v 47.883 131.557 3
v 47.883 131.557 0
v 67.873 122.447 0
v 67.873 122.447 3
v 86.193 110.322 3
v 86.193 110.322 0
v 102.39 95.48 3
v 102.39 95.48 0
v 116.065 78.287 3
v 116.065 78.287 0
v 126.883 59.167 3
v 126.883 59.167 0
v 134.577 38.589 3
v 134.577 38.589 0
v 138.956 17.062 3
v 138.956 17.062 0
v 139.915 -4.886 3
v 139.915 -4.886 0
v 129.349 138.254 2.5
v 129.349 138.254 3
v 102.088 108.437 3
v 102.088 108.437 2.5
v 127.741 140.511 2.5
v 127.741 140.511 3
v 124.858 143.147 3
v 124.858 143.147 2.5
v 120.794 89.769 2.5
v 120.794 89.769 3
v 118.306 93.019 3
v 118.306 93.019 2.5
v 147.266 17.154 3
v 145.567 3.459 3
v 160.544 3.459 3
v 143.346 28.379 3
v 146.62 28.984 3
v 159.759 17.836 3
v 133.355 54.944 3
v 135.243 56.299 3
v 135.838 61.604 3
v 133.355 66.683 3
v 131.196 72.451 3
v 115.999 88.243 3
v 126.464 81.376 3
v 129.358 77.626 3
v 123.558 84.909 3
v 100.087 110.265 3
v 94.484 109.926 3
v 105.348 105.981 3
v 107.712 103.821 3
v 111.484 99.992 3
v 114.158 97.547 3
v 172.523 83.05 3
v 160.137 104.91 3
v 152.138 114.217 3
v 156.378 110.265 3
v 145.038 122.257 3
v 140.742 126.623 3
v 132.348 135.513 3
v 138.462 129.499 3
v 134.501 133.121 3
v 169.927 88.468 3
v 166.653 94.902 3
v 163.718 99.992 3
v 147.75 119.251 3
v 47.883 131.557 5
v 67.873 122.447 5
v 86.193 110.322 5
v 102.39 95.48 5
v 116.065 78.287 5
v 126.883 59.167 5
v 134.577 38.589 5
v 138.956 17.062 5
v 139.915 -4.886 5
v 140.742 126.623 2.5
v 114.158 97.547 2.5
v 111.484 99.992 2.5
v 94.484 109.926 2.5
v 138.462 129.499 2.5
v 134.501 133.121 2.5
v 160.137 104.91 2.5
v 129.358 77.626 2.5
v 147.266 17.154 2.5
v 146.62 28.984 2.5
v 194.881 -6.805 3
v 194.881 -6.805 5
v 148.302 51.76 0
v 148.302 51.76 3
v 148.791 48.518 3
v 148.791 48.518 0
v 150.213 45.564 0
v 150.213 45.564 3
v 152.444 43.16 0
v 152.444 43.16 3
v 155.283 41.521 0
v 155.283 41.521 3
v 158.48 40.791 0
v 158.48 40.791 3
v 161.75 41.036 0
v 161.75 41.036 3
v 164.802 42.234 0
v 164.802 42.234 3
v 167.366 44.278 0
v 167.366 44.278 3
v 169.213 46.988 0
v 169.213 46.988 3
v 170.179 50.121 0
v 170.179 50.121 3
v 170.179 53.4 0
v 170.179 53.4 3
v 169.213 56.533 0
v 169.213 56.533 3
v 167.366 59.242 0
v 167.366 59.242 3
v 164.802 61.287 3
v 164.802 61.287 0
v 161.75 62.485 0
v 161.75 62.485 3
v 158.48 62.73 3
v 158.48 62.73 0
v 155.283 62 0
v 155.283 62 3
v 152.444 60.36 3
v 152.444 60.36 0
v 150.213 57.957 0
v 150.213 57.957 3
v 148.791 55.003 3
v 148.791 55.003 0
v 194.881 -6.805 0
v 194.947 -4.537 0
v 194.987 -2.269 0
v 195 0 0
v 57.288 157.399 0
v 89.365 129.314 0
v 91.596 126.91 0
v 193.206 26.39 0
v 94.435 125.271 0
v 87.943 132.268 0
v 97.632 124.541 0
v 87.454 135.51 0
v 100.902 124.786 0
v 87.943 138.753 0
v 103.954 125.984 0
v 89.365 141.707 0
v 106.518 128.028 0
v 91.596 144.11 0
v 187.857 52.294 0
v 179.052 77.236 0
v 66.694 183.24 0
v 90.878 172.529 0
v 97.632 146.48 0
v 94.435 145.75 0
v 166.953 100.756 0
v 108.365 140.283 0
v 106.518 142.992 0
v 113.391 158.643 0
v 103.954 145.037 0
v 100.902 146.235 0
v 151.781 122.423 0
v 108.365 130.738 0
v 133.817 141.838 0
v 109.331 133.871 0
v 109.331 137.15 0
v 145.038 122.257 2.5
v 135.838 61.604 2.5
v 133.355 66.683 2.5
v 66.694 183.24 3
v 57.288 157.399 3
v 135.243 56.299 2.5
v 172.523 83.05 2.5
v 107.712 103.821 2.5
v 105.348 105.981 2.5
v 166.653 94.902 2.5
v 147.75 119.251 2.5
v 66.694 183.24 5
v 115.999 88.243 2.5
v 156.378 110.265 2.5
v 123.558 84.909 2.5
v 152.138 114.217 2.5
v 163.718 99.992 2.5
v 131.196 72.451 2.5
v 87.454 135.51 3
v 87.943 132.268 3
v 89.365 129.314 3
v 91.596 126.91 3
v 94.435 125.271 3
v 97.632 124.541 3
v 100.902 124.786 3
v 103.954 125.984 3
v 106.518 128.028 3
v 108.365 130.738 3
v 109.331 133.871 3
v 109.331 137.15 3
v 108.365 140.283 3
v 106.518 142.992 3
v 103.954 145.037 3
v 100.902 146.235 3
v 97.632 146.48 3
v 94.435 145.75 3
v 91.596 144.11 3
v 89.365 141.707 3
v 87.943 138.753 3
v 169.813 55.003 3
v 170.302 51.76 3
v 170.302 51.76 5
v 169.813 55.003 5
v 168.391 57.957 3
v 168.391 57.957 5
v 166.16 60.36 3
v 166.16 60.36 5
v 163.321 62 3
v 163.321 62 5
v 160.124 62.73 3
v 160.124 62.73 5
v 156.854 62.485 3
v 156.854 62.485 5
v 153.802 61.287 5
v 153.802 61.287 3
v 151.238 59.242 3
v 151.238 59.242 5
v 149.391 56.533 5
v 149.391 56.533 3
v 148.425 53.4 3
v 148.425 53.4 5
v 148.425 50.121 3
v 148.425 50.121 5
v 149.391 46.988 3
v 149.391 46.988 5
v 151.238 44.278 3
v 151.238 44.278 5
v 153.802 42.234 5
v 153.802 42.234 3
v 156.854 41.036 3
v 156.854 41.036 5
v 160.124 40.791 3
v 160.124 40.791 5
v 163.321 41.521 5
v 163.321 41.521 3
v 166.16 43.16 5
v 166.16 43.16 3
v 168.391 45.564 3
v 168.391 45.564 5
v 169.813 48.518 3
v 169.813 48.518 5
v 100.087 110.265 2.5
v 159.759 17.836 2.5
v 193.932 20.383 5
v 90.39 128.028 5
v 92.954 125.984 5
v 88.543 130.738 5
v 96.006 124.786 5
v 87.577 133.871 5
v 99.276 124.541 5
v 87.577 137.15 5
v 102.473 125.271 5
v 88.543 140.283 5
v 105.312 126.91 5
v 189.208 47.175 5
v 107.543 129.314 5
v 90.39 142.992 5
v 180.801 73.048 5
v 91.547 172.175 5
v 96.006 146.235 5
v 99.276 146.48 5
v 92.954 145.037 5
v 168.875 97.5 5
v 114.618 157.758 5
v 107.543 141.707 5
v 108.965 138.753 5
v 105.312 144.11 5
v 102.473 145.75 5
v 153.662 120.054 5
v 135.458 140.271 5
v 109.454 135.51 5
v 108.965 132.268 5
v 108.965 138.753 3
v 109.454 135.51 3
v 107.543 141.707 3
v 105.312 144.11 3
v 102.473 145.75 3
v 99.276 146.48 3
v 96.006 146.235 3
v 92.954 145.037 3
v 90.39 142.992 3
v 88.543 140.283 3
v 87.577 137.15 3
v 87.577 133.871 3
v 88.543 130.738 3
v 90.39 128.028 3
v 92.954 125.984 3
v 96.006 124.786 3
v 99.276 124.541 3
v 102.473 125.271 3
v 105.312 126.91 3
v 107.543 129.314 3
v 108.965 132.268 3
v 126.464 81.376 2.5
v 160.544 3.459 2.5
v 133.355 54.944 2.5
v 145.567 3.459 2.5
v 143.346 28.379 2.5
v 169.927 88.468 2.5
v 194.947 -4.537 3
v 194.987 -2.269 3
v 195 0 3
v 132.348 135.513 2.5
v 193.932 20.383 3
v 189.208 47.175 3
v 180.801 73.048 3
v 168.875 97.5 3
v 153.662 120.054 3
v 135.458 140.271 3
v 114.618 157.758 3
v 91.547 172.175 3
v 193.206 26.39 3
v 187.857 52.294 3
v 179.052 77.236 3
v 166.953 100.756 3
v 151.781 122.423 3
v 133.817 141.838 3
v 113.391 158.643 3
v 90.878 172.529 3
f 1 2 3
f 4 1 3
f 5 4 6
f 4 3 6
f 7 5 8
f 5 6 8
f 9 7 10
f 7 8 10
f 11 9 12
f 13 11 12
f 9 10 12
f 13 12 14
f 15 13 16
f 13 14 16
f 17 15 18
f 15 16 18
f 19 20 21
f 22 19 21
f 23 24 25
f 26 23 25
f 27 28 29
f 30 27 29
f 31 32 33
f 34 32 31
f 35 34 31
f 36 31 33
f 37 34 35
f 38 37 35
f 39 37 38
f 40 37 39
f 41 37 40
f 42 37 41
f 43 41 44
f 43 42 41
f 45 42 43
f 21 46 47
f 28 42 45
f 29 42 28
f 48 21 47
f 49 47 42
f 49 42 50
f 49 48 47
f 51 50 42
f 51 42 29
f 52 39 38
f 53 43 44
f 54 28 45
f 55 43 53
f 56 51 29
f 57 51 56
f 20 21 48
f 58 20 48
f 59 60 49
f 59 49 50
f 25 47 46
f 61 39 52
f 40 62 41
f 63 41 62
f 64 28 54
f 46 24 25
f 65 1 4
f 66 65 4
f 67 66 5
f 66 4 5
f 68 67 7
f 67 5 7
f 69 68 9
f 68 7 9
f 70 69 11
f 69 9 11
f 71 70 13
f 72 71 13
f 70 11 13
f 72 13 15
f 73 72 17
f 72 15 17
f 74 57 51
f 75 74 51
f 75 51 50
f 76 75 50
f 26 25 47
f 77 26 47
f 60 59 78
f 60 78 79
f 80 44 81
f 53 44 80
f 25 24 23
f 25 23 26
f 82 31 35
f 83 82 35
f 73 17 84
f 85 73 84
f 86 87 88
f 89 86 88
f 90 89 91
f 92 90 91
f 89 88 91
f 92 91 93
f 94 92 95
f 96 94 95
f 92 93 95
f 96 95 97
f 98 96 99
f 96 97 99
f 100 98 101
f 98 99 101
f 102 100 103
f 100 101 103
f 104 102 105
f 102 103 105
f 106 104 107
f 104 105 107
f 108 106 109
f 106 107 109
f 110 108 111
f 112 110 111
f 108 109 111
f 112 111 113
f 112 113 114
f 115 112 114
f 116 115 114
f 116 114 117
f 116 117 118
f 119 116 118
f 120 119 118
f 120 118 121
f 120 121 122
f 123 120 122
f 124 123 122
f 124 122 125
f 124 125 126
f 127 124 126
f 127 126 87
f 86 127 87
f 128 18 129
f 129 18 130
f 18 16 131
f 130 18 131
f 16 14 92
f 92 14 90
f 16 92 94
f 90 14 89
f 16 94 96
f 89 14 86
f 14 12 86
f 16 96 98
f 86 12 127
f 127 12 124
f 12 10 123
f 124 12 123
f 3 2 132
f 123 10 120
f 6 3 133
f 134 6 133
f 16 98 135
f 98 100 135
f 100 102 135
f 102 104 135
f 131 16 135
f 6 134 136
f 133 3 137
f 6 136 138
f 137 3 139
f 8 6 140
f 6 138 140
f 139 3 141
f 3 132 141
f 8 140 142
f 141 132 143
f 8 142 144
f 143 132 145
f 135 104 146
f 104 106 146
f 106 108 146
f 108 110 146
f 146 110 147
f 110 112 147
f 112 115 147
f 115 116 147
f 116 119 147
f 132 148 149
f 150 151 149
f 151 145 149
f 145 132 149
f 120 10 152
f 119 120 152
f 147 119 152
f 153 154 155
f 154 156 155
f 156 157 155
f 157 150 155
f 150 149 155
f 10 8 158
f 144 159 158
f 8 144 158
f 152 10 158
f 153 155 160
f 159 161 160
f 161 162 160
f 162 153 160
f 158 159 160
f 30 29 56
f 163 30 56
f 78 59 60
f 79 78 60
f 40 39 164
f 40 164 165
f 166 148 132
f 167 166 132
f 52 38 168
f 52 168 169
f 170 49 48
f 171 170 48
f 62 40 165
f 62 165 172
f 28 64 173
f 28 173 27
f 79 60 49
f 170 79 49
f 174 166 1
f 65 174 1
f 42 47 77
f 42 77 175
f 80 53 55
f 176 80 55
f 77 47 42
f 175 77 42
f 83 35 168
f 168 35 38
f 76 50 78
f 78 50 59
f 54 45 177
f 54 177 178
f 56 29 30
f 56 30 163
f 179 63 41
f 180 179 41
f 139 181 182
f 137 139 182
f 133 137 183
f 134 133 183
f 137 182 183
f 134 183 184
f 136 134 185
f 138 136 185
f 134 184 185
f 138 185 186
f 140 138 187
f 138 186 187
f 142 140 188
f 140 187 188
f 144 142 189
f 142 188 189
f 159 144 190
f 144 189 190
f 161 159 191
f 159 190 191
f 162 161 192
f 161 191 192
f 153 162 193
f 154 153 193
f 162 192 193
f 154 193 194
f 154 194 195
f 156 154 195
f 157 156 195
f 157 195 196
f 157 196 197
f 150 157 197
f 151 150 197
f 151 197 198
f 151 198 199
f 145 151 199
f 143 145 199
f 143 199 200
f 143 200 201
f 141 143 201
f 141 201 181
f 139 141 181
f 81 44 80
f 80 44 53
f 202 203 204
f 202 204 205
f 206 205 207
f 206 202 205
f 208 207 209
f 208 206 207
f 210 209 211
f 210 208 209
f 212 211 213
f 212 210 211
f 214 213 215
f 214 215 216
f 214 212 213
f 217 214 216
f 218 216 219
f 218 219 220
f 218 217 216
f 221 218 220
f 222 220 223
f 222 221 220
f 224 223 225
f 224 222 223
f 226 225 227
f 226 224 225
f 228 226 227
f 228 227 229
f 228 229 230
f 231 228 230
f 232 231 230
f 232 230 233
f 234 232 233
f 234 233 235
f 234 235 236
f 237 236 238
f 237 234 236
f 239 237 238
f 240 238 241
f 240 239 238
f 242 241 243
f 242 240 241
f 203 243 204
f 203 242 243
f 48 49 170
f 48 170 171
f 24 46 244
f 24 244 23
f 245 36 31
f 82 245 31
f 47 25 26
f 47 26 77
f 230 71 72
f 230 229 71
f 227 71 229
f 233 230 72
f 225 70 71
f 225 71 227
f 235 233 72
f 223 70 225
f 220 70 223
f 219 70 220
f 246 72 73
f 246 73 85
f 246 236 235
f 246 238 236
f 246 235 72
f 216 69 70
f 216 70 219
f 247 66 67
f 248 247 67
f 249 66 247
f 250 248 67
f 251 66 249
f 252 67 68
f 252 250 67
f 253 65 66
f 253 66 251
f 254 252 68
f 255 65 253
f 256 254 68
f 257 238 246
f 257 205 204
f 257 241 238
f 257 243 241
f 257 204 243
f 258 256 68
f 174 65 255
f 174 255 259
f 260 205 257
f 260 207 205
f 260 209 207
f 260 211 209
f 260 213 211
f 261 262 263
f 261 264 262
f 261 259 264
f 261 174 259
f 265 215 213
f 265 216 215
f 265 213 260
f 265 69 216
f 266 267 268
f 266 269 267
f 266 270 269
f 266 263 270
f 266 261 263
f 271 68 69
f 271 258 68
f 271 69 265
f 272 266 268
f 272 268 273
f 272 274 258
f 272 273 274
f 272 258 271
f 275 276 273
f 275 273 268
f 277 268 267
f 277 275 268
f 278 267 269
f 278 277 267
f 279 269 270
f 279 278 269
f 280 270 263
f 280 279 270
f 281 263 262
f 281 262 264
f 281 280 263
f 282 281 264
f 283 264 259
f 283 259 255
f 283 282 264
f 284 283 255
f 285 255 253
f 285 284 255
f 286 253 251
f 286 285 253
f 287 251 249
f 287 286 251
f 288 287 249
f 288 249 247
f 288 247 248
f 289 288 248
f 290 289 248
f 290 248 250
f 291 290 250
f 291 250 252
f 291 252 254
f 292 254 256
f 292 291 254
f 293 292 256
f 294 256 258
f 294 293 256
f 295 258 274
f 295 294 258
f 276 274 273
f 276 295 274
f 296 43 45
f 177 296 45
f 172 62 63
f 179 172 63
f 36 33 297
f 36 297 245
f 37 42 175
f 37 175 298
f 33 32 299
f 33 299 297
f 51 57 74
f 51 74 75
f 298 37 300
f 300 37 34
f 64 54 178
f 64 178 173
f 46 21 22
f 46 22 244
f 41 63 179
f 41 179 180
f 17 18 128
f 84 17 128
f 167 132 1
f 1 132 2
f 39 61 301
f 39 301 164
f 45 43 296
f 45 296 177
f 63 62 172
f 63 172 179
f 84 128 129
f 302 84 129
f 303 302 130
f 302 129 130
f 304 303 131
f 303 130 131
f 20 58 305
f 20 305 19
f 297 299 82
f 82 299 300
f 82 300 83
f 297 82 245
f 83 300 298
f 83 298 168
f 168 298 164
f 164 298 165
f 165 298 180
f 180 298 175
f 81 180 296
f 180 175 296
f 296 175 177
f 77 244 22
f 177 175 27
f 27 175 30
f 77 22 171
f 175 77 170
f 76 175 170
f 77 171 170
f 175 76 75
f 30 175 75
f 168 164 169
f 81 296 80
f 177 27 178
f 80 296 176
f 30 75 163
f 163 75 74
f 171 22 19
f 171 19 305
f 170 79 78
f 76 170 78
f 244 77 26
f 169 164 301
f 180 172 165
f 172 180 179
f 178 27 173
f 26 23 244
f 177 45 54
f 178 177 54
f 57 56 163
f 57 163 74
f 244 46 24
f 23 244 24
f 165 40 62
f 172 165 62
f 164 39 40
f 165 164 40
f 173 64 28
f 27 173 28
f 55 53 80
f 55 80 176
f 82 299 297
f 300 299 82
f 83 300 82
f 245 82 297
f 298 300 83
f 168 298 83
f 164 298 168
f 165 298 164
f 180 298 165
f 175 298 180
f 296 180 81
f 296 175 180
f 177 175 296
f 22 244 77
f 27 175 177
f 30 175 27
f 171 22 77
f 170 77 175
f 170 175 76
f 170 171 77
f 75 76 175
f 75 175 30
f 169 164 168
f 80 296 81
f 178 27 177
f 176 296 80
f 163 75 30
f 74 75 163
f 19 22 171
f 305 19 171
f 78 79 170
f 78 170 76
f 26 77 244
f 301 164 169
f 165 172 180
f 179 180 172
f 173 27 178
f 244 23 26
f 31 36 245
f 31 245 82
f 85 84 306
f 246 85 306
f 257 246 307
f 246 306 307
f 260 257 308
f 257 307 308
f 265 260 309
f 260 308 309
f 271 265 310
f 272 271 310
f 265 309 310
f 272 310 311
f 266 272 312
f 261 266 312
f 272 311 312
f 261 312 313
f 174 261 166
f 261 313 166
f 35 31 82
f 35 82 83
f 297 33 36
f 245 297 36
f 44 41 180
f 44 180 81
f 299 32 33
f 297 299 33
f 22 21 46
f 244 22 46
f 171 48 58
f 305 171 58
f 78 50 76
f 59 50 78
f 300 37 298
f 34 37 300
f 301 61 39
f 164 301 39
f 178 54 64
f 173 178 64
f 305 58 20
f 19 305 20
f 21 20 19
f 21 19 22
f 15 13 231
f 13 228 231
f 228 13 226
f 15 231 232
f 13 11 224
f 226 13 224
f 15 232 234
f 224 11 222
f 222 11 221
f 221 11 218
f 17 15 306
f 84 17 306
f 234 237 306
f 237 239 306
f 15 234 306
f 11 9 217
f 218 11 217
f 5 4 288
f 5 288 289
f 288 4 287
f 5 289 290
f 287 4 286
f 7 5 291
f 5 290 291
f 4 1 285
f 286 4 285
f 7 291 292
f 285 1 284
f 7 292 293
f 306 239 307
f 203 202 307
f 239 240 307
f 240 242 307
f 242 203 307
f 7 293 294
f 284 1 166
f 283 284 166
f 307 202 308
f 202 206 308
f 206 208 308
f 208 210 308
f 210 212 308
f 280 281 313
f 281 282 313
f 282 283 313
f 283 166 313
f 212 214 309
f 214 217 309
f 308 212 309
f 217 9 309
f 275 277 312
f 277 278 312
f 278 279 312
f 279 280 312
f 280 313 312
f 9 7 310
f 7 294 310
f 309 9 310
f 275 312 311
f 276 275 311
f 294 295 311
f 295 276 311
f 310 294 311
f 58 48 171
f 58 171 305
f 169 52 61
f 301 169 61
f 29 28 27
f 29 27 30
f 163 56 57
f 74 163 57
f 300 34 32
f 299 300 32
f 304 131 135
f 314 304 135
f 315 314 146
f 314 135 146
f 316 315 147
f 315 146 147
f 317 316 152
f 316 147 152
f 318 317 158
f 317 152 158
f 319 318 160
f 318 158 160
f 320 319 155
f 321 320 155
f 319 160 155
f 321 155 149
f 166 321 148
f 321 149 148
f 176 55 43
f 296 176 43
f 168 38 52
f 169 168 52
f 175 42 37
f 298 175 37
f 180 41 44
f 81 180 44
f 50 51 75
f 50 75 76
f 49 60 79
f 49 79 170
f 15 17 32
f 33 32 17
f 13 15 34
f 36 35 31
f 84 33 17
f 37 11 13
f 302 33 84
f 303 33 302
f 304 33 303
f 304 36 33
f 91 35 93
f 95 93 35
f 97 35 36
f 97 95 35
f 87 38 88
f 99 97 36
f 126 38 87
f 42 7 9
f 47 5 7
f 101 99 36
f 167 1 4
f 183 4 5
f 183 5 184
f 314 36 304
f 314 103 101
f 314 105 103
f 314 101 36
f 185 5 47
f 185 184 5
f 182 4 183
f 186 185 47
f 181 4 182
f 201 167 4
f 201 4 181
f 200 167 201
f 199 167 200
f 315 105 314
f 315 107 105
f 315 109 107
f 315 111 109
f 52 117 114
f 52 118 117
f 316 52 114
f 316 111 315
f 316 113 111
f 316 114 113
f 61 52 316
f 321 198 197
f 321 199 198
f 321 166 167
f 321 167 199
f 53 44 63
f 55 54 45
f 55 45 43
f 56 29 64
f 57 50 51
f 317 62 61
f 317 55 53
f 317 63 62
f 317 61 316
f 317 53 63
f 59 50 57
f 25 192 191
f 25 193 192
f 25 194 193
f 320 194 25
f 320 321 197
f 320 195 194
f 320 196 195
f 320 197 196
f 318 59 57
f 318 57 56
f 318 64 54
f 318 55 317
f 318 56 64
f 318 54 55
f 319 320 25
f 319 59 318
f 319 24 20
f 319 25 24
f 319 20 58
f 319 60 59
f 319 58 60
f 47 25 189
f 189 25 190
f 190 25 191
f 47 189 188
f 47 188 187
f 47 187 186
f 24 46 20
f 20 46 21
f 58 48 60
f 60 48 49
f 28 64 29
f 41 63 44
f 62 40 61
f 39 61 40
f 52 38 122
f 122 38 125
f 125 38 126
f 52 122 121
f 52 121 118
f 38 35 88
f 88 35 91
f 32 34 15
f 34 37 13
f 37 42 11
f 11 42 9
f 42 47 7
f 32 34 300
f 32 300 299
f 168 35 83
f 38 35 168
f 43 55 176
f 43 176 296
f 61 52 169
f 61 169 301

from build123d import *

# Parameters (mm, degrees)
F1_DEPTH = 3
F2_D     = 22
F4_DEPTH = 0.5
F5_DEPTH = 0.5
F6_R     = 11
F7_DEPTH = 2


with BuildPart() as f1:
    # F0 (on Top) → F1 (new body)
    with BuildSketch(Plane.XY):
        with BuildLine():
            ThreePointArc((167.5, 0), (137.2079674184, 96.0740530888), (57.288374007, 157.3985139816))
            Line((57.288374007, 157.3985139816), (47.8828200656, 131.55696691))
            ThreePointArc((47.8828200656, 131.55696691), (114.6812862005, 80.3007010891), (140, 0))
            ThreePointArc((140, 0), (139.9786773219, -2.4433369012), (139.9147157827, -4.8859295383))
            Line((139.9147157827, -4.8859295384), (167.3979635257, -5.8456656977))
            ThreePointArc((167.3979635257, -5.8456656977), (167.4744889387, -2.9232780782), (167.5, 0))
        make_face()
        with BuildLine():
            ThreePointArc((194.8812112687, -6.805401857), (194.9703005555, -3.4032192553), (195, 0))
            ThreePointArc((195, 0), (159.7346486364, 111.8474050885), (66.6939279485, 183.2400610533))
            Line((66.6939279485, 183.2400610533), (57.288374007, 157.3985139816))
            ThreePointArc((57.288374007, 157.3985139816), (137.2079674184, 96.0740530888), (167.5, 0))
            ThreePointArc((167.5, 0), (167.4744889387, -2.9232780782), (167.3979635257, -5.8456656977))
            Line((167.3979635257, -5.8456656977), (194.8812112687, -6.805401857))
        make_face()
    extrude(amount=F1_DEPTH)

    # F2 (through all)
    with Locations(Plane(origin=(0, 0, 0), x_dir=(1, 0, 0), z_dir=(0, 0, -1))):
        with Locations((98.454029759, -135.5103465578), (159.3019664794, -51.7603465578), (159.3019664794, 51.7603465578)):
            Hole(F2_D / 2)

    # F3 (on face) → F4 (cut)
    with BuildSketch(Plane.XY.offset(3)):
        Polygon((124.8575970531, 143.1473642588), (94.484128058, 109.9263876677), (115.9989386797, 88.2433280349), (133.3547979593, 54.9442470074), (143.3461606503, 28.3794309944), (145.5672979355, 3.4586815163), (160.543859005, 3.4586815163), (159.7588807344, 17.8357362747), (147.2658441237, 17.1536242262), (146.6199150106, 28.9839621818), (135.2427917925, 56.2990322707), (172.5227981806, 83.0503925681), (169.9266433716, 88.468439877), (135.8380764723, 61.6039372981), (133.3547979593, 66.6833594441), (166.6532456875, 94.9023813009), (163.7184619904, 99.9917068722), (131.1962753534, 72.4506676197), (129.3583959341, 77.6262283325), (160.1365059614, 104.9097552896), (156.3779860735, 110.2651243658), (126.4639943838, 81.376105547), (123.5579997301, 84.909029305), (152.1375179291, 114.2166703939), (147.7499727119, 119.2514494077), (120.7944825292, 89.7688865662), (118.305986066, 93.0192662431), (145.0375318527, 122.2568899393), (140.7417208361, 126.6233589756), (114.1578362166, 97.5472396562), (111.4842006113, 99.9917068722), (138.4624362817, 129.499147587), (134.5007407959, 133.1212697326), (107.7115796058, 103.8206291987), (105.3481470084, 105.9814821923), (132.3479912187, 135.512557244), (129.3493856729, 138.2541398801), (102.0875399782, 108.436500749), (100.0874832057, 110.2651243658), (127.7409781047, 140.5111297479), align=None)
    extrude(amount=-F4_DEPTH, mode=Mode.SUBTRACT)


with BuildPart() as f5:
    # F3 (on face) → F5 (new body)
    with BuildSketch(Plane.XY.offset(3)):
        Polygon((124.8575970531, 143.1473642588), (94.484128058, 109.9263876677), (115.9989386797, 88.2433280349), (133.3547979593, 54.9442470074), (143.3461606503, 28.3794309944), (145.5672979355, 3.4586815163), (160.543859005, 3.4586815163), (159.7588807344, 17.8357362747), (147.2658441237, 17.1536242262), (146.6199150106, 28.9839621818), (135.2427917925, 56.2990322707), (172.5227981806, 83.0503925681), (169.9266433716, 88.468439877), (135.8380764723, 61.6039372981), (133.3547979593, 66.6833594441), (166.6532456875, 94.9023813009), (163.7184619904, 99.9917068722), (131.1962753534, 72.4506676197), (129.3583959341, 77.6262283325), (160.1365059614, 104.9097552896), (156.3779860735, 110.2651243658), (126.4639943838, 81.376105547), (123.5579997301, 84.909029305), (152.1375179291, 114.2166703939), (147.7499727119, 119.2514494077), (120.7944825292, 89.7688865662), (118.305986066, 93.0192662431), (145.0375318527, 122.2568899393), (140.7417208361, 126.6233589756), (114.1578362166, 97.5472396562), (111.4842006113, 99.9917068722), (138.4624362817, 129.499147587), (134.5007407959, 133.1212697326), (107.7115796058, 103.8206291987), (105.3481470084, 105.9814821923), (132.3479912187, 135.512557244), (129.3493856729, 138.2541398801), (102.0875399782, 108.436500749), (100.0874832057, 110.2651243658), (127.7409781047, 140.5111297479), align=None)
    extrude(amount=-F5_DEPTH)


with BuildPart() as f7:
    # F6 (on face) → F7 (new body)
    with BuildSketch(Plane.XY.offset(3)):
        with BuildLine():
            Line((66.6939279485, 183.2400610533), (47.8828200656, 131.55696691))
            ThreePointArc((47.8828200656, 131.55696691), (116.0652601577, 78.2870064859), (139.9147157827, -4.8859295383))
            Line((139.9147157827, -4.8859295383), (194.8812112687, -6.805401857))
            ThreePointArc((194.8812112687, -6.805401857), (161.6623266482, 109.0426161768), (66.6939279485, 183.2400610533))
        make_face()
        Polygon((115.9989386797, 88.2433280349), (94.484128058, 109.9263876677), (124.8575970531, 143.1473642588), (127.7409781047, 140.5111297479), (100.0874832057, 110.2651243658), (102.0875399782, 108.436500749), (129.3493856729, 138.2541398801), (132.3479912187, 135.512557244), (105.3481470084, 105.9814821923), (107.7115796058, 103.8206291987), (134.5007407959, 133.1212697326), (138.4624362817, 129.499147587), (111.4842006113, 99.9917068722), (114.1578362166, 97.5472396562), (140.7417208361, 126.6233589756), (145.0375318527, 122.2568899393), (118.305986066, 93.0192662431), (120.7944825292, 89.7688865662), (147.7499727119, 119.2514494077), (152.1375179291, 114.2166703939), (123.5579997301, 84.909029305), (126.4639943838, 81.376105547), (156.3779860735, 110.2651243658), (160.1365059614, 104.9097552896), (129.3583959341, 77.6262283325), (131.1962753534, 72.4506676197), (163.7184619904, 99.9917068722), (166.6532456875, 94.9023813009), (133.3547979593, 66.6833594441), (135.8380764723, 61.6039372981), (169.9266433716, 88.468439877), (172.5227981806, 83.0503925681), (135.2427917925, 56.2990322707), (146.6199150106, 28.9839621818), (147.2658441237, 17.1536242262), (159.7588807344, 17.8357362747), (160.543859005, 3.4586815163), (145.5672979355, 3.4586815163), (143.3461606503, 28.3794309944), (133.3547979593, 54.9442470074), align=None, mode=Mode.SUBTRACT)
        with Locations((159.3019664794, 51.7603465578)):
            Circle(F6_R, mode=Mode.SUBTRACT)
        with Locations((98.454029759, 135.5103465578)):
            Circle(F6_R, mode=Mode.SUBTRACT)
        Polygon((124.8575970531, 143.1473642588), (94.484128058, 109.9263876677), (115.9989386797, 88.2433280349), (133.3547979593, 54.9442470074), (143.3461606503, 28.3794309944), (145.5672979355, 3.4586815163), (160.543859005, 3.4586815163), (159.7588807344, 17.8357362747), (147.2658441237, 17.1536242262), (146.6199150106, 28.9839621818), (135.2427917925, 56.2990322707), (172.5227981806, 83.0503925681), (169.9266433716, 88.468439877), (135.8380764723, 61.6039372981), (133.3547979593, 66.6833594441), (166.6532456875, 94.9023813009), (163.7184619904, 99.9917068722), (131.1962753534, 72.4506676197), (129.3583959341, 77.6262283325), (160.1365059614, 104.9097552896), (156.3779860735, 110.2651243658), (126.4639943838, 81.376105547), (123.5579997301, 84.909029305), (152.1375179291, 114.2166703939), (147.7499727119, 119.2514494077), (120.7944825292, 89.7688865662), (118.305986066, 93.0192662431), (145.0375318527, 122.2568899393), (140.7417208361, 126.6233589756), (114.1578362166, 97.5472396562), (111.4842006113, 99.9917068722), (138.4624362817, 129.499147587), (134.5007407959, 133.1212697326), (107.7115796058, 103.8206291987), (105.3481470084, 105.9814821923), (132.3479912187, 135.512557244), (129.3493856729, 138.2541398801), (102.0875399782, 108.436500749), (100.0874832057, 110.2651243658), (127.7409781047, 140.5111297479), align=None)
    extrude(amount=F7_DEPTH)


solid = Compound([f1.part, f5.part, f7.part])
